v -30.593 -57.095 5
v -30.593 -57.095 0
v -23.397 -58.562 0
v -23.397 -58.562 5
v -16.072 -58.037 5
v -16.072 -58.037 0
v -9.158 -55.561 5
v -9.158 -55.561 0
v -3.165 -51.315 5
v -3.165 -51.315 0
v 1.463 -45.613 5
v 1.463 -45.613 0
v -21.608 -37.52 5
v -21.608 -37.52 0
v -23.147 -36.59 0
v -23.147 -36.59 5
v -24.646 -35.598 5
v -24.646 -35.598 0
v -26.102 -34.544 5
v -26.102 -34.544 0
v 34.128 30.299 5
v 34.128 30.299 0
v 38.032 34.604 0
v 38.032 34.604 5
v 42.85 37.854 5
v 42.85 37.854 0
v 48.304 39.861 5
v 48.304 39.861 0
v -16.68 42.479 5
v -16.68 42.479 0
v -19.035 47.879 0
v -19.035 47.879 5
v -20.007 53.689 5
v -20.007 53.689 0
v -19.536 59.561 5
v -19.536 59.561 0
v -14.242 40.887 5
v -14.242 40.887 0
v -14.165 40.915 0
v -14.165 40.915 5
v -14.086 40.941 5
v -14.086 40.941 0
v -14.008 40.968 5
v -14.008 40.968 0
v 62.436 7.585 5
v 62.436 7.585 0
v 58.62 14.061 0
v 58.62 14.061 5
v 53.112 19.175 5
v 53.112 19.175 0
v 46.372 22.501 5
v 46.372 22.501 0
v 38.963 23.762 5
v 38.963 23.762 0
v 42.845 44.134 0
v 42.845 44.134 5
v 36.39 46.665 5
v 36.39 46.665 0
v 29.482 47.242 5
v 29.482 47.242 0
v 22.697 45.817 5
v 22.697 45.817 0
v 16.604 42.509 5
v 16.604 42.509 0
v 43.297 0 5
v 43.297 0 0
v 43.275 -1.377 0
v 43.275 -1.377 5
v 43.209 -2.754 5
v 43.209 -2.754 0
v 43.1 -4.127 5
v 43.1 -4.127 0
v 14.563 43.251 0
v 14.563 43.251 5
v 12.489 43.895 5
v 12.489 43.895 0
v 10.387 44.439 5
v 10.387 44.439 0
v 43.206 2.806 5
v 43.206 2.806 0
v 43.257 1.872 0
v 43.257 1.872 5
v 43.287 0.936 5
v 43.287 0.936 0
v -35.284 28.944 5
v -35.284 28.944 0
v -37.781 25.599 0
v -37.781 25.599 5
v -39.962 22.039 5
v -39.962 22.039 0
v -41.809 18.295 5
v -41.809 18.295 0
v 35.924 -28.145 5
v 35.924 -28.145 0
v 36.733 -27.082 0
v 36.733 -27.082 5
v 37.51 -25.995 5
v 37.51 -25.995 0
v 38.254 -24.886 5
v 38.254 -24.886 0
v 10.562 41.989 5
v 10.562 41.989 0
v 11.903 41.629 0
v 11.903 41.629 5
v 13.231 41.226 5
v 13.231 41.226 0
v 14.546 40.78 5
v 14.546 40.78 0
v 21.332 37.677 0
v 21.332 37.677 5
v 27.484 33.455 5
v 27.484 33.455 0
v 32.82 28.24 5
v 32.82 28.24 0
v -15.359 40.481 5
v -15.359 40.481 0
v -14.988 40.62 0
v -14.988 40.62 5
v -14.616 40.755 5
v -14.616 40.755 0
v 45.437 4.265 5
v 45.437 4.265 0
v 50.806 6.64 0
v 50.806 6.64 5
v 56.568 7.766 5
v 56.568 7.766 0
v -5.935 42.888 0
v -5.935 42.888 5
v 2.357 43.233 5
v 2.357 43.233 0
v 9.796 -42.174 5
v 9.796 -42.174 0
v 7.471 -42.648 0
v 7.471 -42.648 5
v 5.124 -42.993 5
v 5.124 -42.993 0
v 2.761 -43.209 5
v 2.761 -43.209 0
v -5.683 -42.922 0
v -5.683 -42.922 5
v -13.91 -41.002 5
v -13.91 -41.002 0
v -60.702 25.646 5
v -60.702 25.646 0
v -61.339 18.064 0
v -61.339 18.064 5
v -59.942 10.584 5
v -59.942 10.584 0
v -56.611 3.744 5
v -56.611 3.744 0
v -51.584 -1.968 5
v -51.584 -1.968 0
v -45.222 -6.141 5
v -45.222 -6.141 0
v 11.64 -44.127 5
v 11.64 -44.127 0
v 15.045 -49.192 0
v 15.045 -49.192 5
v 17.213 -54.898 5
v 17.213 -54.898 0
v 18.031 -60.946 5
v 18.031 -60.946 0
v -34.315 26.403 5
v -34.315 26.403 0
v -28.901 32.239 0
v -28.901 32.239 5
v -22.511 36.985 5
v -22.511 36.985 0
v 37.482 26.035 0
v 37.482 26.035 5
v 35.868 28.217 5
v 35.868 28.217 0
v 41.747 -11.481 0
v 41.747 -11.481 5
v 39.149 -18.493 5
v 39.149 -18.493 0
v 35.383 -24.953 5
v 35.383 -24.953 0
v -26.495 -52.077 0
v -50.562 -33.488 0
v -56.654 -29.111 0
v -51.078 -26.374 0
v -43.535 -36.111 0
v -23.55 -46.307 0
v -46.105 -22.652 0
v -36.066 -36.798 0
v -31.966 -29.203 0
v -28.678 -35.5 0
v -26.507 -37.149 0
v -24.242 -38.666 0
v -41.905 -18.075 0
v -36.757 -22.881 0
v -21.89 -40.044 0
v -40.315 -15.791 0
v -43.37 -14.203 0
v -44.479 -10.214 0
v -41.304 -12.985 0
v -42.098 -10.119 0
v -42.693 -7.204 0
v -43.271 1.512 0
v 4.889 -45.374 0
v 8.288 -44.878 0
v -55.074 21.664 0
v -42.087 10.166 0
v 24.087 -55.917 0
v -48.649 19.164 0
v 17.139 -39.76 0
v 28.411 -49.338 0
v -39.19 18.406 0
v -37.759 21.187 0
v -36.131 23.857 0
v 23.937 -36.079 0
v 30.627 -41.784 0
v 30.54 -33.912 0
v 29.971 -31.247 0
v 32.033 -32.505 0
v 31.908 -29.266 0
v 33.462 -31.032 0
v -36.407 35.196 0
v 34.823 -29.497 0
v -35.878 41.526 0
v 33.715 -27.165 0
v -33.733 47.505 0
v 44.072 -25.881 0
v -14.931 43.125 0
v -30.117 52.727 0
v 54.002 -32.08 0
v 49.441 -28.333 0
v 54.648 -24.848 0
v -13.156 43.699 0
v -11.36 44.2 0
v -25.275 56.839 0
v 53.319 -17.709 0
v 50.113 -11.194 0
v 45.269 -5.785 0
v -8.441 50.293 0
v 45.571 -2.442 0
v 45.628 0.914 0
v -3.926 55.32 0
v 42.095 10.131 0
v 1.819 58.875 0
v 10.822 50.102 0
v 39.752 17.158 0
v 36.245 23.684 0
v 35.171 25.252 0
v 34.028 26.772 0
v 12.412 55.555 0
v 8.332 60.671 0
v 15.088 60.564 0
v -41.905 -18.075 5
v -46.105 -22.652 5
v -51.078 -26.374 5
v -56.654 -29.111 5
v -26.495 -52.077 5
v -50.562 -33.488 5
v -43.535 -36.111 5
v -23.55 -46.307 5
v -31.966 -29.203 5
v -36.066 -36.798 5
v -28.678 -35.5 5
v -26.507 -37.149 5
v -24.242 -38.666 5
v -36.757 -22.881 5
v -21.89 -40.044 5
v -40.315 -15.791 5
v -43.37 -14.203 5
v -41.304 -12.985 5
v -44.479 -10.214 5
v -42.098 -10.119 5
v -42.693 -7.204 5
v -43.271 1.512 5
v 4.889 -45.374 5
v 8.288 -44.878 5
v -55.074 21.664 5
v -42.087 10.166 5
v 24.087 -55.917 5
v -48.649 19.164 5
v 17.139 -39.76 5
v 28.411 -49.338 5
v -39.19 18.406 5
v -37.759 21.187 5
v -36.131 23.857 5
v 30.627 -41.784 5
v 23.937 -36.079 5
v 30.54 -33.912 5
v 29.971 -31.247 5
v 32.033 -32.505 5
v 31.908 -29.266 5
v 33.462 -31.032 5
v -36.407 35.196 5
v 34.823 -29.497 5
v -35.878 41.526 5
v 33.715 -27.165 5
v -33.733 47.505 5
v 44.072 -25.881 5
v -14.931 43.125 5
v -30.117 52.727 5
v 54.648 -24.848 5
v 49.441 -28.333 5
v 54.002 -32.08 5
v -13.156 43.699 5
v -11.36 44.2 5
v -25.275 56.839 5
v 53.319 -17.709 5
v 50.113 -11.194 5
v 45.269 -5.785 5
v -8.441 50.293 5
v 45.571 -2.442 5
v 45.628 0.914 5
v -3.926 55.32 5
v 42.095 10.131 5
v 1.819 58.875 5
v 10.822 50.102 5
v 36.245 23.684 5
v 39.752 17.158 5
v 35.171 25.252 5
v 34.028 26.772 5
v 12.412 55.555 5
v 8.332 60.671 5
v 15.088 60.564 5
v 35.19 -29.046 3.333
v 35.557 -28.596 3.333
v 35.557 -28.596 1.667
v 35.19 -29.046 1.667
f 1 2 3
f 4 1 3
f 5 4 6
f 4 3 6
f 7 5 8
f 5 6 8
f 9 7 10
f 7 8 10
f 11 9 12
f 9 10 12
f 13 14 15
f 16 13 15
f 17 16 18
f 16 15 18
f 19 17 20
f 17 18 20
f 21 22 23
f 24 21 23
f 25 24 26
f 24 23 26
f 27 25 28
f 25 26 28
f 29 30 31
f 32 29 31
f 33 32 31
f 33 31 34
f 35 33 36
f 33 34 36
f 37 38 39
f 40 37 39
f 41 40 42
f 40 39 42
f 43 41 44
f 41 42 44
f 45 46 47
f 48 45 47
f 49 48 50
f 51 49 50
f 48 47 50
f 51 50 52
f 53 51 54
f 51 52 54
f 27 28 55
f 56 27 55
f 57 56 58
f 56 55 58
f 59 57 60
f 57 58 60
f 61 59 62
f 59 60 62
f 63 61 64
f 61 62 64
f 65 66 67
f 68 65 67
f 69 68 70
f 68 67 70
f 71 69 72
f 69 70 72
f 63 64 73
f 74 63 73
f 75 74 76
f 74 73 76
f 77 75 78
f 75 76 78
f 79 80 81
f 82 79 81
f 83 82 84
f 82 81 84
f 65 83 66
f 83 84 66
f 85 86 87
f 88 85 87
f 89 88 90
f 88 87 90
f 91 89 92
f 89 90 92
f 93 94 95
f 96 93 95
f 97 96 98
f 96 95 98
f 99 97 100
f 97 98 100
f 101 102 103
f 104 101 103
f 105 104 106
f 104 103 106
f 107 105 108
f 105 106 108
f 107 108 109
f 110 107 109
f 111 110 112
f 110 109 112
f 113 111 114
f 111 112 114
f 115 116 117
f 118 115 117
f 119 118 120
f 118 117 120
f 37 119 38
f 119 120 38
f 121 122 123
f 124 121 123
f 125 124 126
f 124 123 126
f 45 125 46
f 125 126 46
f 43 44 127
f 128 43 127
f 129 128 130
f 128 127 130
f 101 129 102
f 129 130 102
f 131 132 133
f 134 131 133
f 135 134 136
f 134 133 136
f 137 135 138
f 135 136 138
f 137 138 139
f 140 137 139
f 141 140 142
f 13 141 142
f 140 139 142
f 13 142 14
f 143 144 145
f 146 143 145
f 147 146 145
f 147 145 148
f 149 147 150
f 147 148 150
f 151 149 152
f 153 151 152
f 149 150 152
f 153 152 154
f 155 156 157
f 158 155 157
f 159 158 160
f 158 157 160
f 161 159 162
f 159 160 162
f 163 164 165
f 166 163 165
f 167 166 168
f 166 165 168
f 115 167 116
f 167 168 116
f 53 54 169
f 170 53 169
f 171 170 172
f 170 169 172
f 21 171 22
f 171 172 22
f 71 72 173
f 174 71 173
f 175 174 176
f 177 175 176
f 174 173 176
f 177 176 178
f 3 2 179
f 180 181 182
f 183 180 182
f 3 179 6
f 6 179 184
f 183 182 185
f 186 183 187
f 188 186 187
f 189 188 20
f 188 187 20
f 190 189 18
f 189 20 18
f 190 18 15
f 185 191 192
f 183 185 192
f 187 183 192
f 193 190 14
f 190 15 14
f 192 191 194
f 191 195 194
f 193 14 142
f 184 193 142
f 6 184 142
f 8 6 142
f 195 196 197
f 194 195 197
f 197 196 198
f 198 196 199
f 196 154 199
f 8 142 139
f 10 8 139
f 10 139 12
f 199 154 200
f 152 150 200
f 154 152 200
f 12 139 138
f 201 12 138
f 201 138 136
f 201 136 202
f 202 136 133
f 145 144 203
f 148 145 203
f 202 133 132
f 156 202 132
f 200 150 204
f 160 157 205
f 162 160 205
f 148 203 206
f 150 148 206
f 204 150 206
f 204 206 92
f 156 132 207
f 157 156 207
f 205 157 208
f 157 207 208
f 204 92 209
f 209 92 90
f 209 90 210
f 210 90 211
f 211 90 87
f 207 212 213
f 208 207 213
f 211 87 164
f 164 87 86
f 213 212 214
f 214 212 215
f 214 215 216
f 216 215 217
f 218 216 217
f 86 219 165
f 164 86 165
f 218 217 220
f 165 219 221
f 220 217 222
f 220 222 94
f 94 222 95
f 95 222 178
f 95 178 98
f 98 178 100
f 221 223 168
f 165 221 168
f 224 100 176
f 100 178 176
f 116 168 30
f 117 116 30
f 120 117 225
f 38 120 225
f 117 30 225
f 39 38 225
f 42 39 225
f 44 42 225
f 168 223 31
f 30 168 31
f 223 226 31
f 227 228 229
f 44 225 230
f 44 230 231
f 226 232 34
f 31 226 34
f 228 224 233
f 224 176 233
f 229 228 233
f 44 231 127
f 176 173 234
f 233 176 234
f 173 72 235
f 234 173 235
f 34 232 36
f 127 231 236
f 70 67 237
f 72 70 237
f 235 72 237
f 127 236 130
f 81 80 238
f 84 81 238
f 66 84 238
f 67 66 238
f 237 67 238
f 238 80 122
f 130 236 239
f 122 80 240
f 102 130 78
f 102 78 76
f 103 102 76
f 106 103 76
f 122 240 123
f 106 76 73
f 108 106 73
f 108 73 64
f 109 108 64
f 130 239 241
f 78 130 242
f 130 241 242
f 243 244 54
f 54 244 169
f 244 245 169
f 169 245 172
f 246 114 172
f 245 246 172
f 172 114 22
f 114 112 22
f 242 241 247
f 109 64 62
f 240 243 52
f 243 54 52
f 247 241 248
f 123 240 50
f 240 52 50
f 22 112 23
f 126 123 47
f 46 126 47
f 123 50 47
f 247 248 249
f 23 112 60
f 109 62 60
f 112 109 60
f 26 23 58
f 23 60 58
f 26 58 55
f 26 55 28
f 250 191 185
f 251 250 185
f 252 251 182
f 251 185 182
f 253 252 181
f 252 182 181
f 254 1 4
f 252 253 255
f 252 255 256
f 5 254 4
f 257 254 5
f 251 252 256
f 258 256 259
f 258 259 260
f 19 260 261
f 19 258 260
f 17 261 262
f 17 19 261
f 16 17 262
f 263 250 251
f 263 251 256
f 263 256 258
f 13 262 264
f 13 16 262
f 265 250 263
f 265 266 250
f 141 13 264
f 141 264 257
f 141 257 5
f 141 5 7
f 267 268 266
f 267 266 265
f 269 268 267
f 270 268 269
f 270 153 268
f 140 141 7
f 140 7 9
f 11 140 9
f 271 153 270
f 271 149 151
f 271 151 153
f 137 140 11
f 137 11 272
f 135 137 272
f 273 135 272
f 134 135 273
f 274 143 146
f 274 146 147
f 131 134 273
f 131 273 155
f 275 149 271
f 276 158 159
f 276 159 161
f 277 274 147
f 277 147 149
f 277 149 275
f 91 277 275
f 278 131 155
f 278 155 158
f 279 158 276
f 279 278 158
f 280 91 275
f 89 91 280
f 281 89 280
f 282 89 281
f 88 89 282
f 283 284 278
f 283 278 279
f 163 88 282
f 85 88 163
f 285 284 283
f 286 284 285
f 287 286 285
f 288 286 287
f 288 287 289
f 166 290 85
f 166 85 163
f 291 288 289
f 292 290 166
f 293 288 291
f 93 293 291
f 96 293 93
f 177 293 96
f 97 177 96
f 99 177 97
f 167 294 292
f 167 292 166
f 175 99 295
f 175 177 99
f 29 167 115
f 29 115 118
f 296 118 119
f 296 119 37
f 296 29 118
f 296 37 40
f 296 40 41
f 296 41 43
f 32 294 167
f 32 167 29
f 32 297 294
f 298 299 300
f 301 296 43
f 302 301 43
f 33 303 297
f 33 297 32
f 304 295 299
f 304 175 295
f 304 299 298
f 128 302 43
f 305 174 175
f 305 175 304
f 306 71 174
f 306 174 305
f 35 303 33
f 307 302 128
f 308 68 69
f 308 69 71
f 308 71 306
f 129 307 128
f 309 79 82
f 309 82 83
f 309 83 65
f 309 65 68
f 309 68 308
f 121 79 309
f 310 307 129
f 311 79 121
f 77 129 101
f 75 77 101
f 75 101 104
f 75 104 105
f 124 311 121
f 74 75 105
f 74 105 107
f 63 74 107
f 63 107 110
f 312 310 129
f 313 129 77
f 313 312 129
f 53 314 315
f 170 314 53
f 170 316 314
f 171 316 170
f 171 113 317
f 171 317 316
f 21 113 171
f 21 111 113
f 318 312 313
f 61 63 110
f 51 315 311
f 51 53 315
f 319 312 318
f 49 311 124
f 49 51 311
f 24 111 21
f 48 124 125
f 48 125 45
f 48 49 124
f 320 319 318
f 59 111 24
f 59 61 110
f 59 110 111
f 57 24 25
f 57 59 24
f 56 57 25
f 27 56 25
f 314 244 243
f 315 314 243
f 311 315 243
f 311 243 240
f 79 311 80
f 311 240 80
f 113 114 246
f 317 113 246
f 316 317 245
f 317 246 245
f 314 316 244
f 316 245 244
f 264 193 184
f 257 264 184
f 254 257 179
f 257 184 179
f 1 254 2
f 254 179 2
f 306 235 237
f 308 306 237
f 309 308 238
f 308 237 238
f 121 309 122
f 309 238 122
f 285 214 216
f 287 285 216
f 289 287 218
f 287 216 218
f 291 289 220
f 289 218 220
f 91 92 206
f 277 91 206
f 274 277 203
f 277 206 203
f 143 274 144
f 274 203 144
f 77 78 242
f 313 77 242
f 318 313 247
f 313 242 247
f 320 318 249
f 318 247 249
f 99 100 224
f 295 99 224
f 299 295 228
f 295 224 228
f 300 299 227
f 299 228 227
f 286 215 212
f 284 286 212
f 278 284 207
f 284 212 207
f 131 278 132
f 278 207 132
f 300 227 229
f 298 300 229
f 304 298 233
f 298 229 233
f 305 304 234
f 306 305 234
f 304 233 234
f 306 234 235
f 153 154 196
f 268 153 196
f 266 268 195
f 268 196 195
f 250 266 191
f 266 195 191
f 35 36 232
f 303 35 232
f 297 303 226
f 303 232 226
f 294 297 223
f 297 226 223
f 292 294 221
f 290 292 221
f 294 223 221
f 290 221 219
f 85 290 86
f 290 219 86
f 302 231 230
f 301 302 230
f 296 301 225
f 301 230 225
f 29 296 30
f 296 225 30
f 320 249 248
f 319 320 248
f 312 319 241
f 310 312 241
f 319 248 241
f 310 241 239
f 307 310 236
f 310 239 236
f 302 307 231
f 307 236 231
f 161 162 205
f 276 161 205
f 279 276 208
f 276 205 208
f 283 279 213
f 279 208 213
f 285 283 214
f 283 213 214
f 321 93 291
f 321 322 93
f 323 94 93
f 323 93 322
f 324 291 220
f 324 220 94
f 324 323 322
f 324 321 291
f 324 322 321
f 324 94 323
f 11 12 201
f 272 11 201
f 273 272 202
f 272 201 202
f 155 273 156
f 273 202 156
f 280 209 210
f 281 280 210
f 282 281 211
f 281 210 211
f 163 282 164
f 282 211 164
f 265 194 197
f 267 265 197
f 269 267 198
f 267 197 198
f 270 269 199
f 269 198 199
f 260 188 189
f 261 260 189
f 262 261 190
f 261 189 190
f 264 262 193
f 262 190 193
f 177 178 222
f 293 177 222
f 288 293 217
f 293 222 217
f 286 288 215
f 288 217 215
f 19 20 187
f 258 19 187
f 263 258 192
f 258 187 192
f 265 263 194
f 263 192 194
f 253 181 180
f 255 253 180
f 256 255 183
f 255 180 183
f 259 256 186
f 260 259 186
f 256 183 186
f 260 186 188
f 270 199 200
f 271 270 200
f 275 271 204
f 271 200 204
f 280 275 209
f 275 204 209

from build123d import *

# Parameters (mm, degrees)
F1_DEPTH = 5


with BuildPart() as f1:
    # F0 (on Top) → F1 (new body)
    with BuildSketch(Plane.XY):
        with BuildLine():
            ThreePointArc((38.502261, -1.597772), (40.718756, 0.748882), (43.205982, 2.806393))
            ThreePointArc((43.205982, 2.806393), (41.074175, 13.694702), (36.245186, 23.683733))
            ThreePointArc((36.245186, 23.683733), (34.607614, 26.018181), (32.819931, 28.239774))
            ThreePointArc((32.819931, 28.239774), (24.499086, 35.699124), (14.546237, 40.780383))
            ThreePointArc((14.546237, 40.780383), (12.950133, 39.127779), (11.519659, 37.329894))
            ThreePointArc((11.519659, 37.329894), (10.939992, 39.638686), (10.562187, 41.988961))
            ThreePointArc((10.562187, 41.988961), (-1.797083, 43.259718), (-14.008372, 40.968258))
            ThreePointArc((-14.008372, 40.968258), (-14.033128, 40.846587), (-14.058419, 40.725026))
            ThreePointArc((-14.058419, 40.725026), (-14.150281, 40.80644), (-14.242495, 40.887456))
            ThreePointArc((-14.242495, 40.887456), (-14.802375, 40.688111), (-15.359467, 40.4811))
            ThreePointArc((-15.359467, 40.4811), (-25.8155, 34.759065), (-34.315088, 26.402792))
            ThreePointArc((-34.315088, 26.402792), (-36.969234, 22.536824), (-39.189715, 18.40649))
            ThreePointArc((-39.189715, 18.40649), (-42.897454, 5.868657), (-42.693446, -7.20433))
            ThreePointArc((-42.693446, -7.20433), (-41.725569, -11.558959), (-40.314768, -15.790888))
            ThreePointArc((-40.314768, -15.790888), (-34.506812, -26.151723), (-26.101976, -34.544457))
            ThreePointArc((-26.101976, -34.544457), (-23.851243, -33.463072), (-21.70451, -32.187641))
            ThreePointArc((-21.70451, -32.187641), (-21.539561, -34.851521), (-21.608116, -37.519622))
            ThreePointArc((-21.608116, -37.519622), (-9.843426, -42.16325), (2.76125, -43.20889))
            ThreePointArc((2.76125, -43.20889), (3.776863, -40.777994), (4.55104, -38.259785))
            ThreePointArc((4.55104, -38.259785), (7.293587, -40.055986), (9.795652, -42.174375))
            ThreePointArc((9.795652, -42.174375), (20.620392, -38.071408), (29.97107, -31.246882))
            ThreePointArc((29.97107, -31.246882), (29.244852, -28.952192), (28.314719, -26.732316))
            ThreePointArc((28.314719, -26.732316), (31.777465, -25.55893), (35.383111, -24.953319))
            ThreePointArc((35.383111, -24.953319), (40.599644, -15.043325), (43.099902, -4.126874))
            ThreePointArc((43.099902, -4.126874), (40.863438, -2.748966), (38.502261, -1.597772))
        make_face()
        with BuildLine():
            ThreePointArc((11.090625, 36.944765), (11.091742, 36.830639), (11.092309, 36.716508))
            ThreePointArc((11.092309, 36.716508), (11.076055, 36.692352), (11.059829, 36.668176))
            ThreePointArc((11.059829, 36.668176), (11.075017, 36.806494), (11.090625, 36.944765))
        make_face(mode=Mode.SUBTRACT)
        with BuildLine():
            add(Edge.make_bspline(
                [(35.924434, -28.145118), (35.55734, -28.595677), (35.190245, -29.046235), (34.82315, -29.496794)],
                knots=[0, 0, 0, 0, 1.743518, 1.743518, 1.743518, 1.743518], degree=3))
            ThreePointArc((35.924434, -28.145118), (37.12508, -26.541309), (38.254179, -24.88635))
            ThreePointArc((38.254179, -24.88635), (42.839633, -15.731451), (45.268646, -5.784669))
            ThreePointArc((45.268646, -5.784669), (45.630344, -0.76446), (45.437012, 4.265048))
            ThreePointArc((45.437012, 4.265048), (43.311152, 14.382515), (38.962614, 23.761888))
            ThreePointArc((38.962614, 23.761888), (36.690962, 27.138275), (34.127567, 30.298875))
            ThreePointArc((34.127567, 30.298875), (26.090127, 37.44353), (16.603983, 42.509063))
            ThreePointArc((16.603983, 42.509063), (13.529918, 43.58502), (10.386943, 44.438993))
            ThreePointArc((10.386943, 44.438993), (-0.500898, 45.633998), (-11.359886, 44.20029))
            ThreePointArc((-11.359886, 44.20029), (-14.046385, 43.421328), (-16.680117, 42.479246))
            ThreePointArc((-16.680117, 42.479246), (-26.848804, 36.903311), (-35.283704, 28.944307))
            ThreePointArc((-35.283704, 28.944307), (-38.912407, 23.844019), (-41.809082, 18.295172))
            ThreePointArc((-41.809082, 18.295172), (-45.198145, 6.31192), (-45.22164, -6.141333))
            ThreePointArc((-45.22164, -6.141333), (-43.969857, -12.221472), (-41.904528, -18.075485))
            ThreePointArc((-41.904528, -18.075485), (-36.350911, -27.592099), (-28.678272, -35.500273))
            ThreePointArc((-28.678272, -35.500273), (-25.385911, -37.924506), (-21.889795, -40.044345))
            ThreePointArc((-21.889795, -40.044345), (-10.586101, -44.391971), (1.46312, -45.613287))
            ThreePointArc((1.46312, -45.613287), (6.593302, -45.157956), (11.639511, -44.12748))
            ThreePointArc((11.639511, -44.12748), (21.699379, -40.147847), (30.539846, -33.912099))
            ThreePointArc((30.539846, -33.912099), (32.755977, -31.776699), (34.82315, -29.496794))
        make_face()
        with BuildLine():
            ThreePointArc((43.205982, 2.806393), (43.274261, 1.403935), (43.297029, 0))
            ThreePointArc((43.297029, 0), (43.247719, -2.06579), (43.099902, -4.126874))
            ThreePointArc((43.099902, -4.126874), (40.599644, -15.043325), (35.383111, -24.953319))
            ThreePointArc((35.383111, -24.953319), (32.828257, -28.230094), (29.97107, -31.246882))
            ThreePointArc((29.97107, -31.246882), (20.620392, -38.071408), (9.795652, -42.174375))
            ThreePointArc((9.795652, -42.174375), (6.299722, -42.836272), (2.76125, -43.20889))
            ThreePointArc((2.76125, -43.20889), (-9.843426, -42.16325), (-21.608116, -37.519622))
            ThreePointArc((-21.608116, -37.519622), (-23.901383, -36.10203), (-26.101976, -34.544457))
            ThreePointArc((-26.101976, -34.544457), (-34.506812, -26.151723), (-40.314768, -15.790888))
            ThreePointArc((-40.314768, -15.790888), (-41.725569, -11.558959), (-42.693446, -7.20433))
            ThreePointArc((-42.693446, -7.20433), (-42.897454, 5.868657), (-39.189715, 18.40649))
            ThreePointArc((-39.189715, 18.40649), (-36.969234, 22.536824), (-34.315088, 26.402792))
            ThreePointArc((-34.315088, 26.402792), (-25.8155, 34.759065), (-15.359467, 40.4811))
            ThreePointArc((-15.359467, 40.4811), (-14.802375, 40.688111), (-14.242495, 40.887456))
            ThreePointArc((-14.242495, 40.887456), (-14.125491, 40.928024), (-14.008372, 40.968258))
            ThreePointArc((-14.008372, 40.968258), (-1.797083, 43.259718), (10.562187, 41.988961))
            ThreePointArc((10.562187, 41.988961), (12.568747, 41.432587), (14.546237, 40.780383))
            ThreePointArc((14.546237, 40.780383), (24.499086, 35.699124), (32.819931, 28.239774))
            ThreePointArc((32.819931, 28.239774), (34.607614, 26.018181), (36.245186, 23.683733))
            ThreePointArc((36.245186, 23.683733), (41.074175, 13.694702), (43.205982, 2.806393))
        make_face(mode=Mode.SUBTRACT)
        with BuildLine():
            ThreePointArc((45.268646, -5.784669), (42.839633, -15.731451), (38.254179, -24.88635))
            ThreePointArc((38.254179, -24.88635), (46.836585, -26.9326), (54.002321, -32.080128))
            ThreePointArc((54.002321, -32.080128), (53.318598, -17.709102), (45.268646, -5.784669))
        make_face()
        with BuildLine():
            ThreePointArc((18.030986, -60.946237), (28.411333, -49.338255), (30.539846, -33.912099))
            ThreePointArc((30.539846, -33.912099), (21.699379, -40.147847), (11.639511, -44.12748))
            ThreePointArc((11.639511, -44.12748), (16.292682, -51.983004), (18.030986, -60.946237))
        make_face()
        with BuildLine():
            ThreePointArc((38.962614, 23.761888), (43.311152, 14.382515), (45.437012, 4.265048))
            ThreePointArc((45.437012, 4.265048), (53.655325, 7.364285), (62.435822, 7.585189))
            ThreePointArc((62.435822, 7.585189), (53.112392, 19.175175), (38.962614, 23.761888))
        make_face()
        with BuildLine():
            ThreePointArc((-30.59298, -57.094834), (-12.530174, -57.035031), (1.46312, -45.613287))
            ThreePointArc((1.46312, -45.613287), (-10.586101, -44.391971), (-21.889795, -40.044345))
            ThreePointArc((-21.889795, -40.044345), (-24.869098, -49.270056), (-30.59298, -57.094834))
        make_face()
        with BuildLine():
            ThreePointArc((16.603983, 42.509063), (26.090127, 37.44353), (34.127567, 30.298875))
            ThreePointArc((34.127567, 30.298875), (40.342926, 36.373929), (48.304058, 39.860666))
            ThreePointArc((48.304058, 39.860666), (32.956953, 47.204731), (16.603983, 42.509063))
        make_face()
        with BuildLine():
            ThreePointArc((-56.653903, -29.111429), (-43.535146, -36.111304), (-28.678272, -35.500273))
            ThreePointArc((-28.678272, -35.500273), (-36.350911, -27.592099), (-41.904528, -18.075485))
            ThreePointArc((-41.904528, -18.075485), (-48.504761, -24.628504), (-56.653903, -29.111429))
        make_face()
        with BuildLine():
            ThreePointArc((-11.359886, 44.20029), (-0.500898, 45.633998), (10.386943, 44.438993))
            ThreePointArc((10.386943, 44.438993), (11.475998, 52.869411), (15.087919, 60.564346))
            ThreePointArc((15.087919, 60.564346), (-1.180367, 57.302692), (-11.359886, 44.20029))
        make_face()
        with BuildLine():
            ThreePointArc((-60.702262, 25.645594), (-58.506458, 7.051887), (-45.22164, -6.141333))
            ThreePointArc((-45.22164, -6.141333), (-45.198145, 6.31192), (-41.809082, 18.295172))
            ThreePointArc((-41.809082, 18.295172), (-51.937891, 20.216839), (-60.702262, 25.645594))
        make_face()
        with BuildLine():
            ThreePointArc((-35.283704, 28.944307), (-26.848804, 36.903311), (-16.680117, 42.479246))
            ThreePointArc((-16.680117, 42.479246), (-19.699815, 50.753822), (-19.535904, 59.560655))
            ThreePointArc((-19.535904, 59.560655), (-33.732866, 47.504807), (-35.283704, 28.944307))
        make_face()
    extrude(amount=F1_DEPTH)


solid = f1.part
